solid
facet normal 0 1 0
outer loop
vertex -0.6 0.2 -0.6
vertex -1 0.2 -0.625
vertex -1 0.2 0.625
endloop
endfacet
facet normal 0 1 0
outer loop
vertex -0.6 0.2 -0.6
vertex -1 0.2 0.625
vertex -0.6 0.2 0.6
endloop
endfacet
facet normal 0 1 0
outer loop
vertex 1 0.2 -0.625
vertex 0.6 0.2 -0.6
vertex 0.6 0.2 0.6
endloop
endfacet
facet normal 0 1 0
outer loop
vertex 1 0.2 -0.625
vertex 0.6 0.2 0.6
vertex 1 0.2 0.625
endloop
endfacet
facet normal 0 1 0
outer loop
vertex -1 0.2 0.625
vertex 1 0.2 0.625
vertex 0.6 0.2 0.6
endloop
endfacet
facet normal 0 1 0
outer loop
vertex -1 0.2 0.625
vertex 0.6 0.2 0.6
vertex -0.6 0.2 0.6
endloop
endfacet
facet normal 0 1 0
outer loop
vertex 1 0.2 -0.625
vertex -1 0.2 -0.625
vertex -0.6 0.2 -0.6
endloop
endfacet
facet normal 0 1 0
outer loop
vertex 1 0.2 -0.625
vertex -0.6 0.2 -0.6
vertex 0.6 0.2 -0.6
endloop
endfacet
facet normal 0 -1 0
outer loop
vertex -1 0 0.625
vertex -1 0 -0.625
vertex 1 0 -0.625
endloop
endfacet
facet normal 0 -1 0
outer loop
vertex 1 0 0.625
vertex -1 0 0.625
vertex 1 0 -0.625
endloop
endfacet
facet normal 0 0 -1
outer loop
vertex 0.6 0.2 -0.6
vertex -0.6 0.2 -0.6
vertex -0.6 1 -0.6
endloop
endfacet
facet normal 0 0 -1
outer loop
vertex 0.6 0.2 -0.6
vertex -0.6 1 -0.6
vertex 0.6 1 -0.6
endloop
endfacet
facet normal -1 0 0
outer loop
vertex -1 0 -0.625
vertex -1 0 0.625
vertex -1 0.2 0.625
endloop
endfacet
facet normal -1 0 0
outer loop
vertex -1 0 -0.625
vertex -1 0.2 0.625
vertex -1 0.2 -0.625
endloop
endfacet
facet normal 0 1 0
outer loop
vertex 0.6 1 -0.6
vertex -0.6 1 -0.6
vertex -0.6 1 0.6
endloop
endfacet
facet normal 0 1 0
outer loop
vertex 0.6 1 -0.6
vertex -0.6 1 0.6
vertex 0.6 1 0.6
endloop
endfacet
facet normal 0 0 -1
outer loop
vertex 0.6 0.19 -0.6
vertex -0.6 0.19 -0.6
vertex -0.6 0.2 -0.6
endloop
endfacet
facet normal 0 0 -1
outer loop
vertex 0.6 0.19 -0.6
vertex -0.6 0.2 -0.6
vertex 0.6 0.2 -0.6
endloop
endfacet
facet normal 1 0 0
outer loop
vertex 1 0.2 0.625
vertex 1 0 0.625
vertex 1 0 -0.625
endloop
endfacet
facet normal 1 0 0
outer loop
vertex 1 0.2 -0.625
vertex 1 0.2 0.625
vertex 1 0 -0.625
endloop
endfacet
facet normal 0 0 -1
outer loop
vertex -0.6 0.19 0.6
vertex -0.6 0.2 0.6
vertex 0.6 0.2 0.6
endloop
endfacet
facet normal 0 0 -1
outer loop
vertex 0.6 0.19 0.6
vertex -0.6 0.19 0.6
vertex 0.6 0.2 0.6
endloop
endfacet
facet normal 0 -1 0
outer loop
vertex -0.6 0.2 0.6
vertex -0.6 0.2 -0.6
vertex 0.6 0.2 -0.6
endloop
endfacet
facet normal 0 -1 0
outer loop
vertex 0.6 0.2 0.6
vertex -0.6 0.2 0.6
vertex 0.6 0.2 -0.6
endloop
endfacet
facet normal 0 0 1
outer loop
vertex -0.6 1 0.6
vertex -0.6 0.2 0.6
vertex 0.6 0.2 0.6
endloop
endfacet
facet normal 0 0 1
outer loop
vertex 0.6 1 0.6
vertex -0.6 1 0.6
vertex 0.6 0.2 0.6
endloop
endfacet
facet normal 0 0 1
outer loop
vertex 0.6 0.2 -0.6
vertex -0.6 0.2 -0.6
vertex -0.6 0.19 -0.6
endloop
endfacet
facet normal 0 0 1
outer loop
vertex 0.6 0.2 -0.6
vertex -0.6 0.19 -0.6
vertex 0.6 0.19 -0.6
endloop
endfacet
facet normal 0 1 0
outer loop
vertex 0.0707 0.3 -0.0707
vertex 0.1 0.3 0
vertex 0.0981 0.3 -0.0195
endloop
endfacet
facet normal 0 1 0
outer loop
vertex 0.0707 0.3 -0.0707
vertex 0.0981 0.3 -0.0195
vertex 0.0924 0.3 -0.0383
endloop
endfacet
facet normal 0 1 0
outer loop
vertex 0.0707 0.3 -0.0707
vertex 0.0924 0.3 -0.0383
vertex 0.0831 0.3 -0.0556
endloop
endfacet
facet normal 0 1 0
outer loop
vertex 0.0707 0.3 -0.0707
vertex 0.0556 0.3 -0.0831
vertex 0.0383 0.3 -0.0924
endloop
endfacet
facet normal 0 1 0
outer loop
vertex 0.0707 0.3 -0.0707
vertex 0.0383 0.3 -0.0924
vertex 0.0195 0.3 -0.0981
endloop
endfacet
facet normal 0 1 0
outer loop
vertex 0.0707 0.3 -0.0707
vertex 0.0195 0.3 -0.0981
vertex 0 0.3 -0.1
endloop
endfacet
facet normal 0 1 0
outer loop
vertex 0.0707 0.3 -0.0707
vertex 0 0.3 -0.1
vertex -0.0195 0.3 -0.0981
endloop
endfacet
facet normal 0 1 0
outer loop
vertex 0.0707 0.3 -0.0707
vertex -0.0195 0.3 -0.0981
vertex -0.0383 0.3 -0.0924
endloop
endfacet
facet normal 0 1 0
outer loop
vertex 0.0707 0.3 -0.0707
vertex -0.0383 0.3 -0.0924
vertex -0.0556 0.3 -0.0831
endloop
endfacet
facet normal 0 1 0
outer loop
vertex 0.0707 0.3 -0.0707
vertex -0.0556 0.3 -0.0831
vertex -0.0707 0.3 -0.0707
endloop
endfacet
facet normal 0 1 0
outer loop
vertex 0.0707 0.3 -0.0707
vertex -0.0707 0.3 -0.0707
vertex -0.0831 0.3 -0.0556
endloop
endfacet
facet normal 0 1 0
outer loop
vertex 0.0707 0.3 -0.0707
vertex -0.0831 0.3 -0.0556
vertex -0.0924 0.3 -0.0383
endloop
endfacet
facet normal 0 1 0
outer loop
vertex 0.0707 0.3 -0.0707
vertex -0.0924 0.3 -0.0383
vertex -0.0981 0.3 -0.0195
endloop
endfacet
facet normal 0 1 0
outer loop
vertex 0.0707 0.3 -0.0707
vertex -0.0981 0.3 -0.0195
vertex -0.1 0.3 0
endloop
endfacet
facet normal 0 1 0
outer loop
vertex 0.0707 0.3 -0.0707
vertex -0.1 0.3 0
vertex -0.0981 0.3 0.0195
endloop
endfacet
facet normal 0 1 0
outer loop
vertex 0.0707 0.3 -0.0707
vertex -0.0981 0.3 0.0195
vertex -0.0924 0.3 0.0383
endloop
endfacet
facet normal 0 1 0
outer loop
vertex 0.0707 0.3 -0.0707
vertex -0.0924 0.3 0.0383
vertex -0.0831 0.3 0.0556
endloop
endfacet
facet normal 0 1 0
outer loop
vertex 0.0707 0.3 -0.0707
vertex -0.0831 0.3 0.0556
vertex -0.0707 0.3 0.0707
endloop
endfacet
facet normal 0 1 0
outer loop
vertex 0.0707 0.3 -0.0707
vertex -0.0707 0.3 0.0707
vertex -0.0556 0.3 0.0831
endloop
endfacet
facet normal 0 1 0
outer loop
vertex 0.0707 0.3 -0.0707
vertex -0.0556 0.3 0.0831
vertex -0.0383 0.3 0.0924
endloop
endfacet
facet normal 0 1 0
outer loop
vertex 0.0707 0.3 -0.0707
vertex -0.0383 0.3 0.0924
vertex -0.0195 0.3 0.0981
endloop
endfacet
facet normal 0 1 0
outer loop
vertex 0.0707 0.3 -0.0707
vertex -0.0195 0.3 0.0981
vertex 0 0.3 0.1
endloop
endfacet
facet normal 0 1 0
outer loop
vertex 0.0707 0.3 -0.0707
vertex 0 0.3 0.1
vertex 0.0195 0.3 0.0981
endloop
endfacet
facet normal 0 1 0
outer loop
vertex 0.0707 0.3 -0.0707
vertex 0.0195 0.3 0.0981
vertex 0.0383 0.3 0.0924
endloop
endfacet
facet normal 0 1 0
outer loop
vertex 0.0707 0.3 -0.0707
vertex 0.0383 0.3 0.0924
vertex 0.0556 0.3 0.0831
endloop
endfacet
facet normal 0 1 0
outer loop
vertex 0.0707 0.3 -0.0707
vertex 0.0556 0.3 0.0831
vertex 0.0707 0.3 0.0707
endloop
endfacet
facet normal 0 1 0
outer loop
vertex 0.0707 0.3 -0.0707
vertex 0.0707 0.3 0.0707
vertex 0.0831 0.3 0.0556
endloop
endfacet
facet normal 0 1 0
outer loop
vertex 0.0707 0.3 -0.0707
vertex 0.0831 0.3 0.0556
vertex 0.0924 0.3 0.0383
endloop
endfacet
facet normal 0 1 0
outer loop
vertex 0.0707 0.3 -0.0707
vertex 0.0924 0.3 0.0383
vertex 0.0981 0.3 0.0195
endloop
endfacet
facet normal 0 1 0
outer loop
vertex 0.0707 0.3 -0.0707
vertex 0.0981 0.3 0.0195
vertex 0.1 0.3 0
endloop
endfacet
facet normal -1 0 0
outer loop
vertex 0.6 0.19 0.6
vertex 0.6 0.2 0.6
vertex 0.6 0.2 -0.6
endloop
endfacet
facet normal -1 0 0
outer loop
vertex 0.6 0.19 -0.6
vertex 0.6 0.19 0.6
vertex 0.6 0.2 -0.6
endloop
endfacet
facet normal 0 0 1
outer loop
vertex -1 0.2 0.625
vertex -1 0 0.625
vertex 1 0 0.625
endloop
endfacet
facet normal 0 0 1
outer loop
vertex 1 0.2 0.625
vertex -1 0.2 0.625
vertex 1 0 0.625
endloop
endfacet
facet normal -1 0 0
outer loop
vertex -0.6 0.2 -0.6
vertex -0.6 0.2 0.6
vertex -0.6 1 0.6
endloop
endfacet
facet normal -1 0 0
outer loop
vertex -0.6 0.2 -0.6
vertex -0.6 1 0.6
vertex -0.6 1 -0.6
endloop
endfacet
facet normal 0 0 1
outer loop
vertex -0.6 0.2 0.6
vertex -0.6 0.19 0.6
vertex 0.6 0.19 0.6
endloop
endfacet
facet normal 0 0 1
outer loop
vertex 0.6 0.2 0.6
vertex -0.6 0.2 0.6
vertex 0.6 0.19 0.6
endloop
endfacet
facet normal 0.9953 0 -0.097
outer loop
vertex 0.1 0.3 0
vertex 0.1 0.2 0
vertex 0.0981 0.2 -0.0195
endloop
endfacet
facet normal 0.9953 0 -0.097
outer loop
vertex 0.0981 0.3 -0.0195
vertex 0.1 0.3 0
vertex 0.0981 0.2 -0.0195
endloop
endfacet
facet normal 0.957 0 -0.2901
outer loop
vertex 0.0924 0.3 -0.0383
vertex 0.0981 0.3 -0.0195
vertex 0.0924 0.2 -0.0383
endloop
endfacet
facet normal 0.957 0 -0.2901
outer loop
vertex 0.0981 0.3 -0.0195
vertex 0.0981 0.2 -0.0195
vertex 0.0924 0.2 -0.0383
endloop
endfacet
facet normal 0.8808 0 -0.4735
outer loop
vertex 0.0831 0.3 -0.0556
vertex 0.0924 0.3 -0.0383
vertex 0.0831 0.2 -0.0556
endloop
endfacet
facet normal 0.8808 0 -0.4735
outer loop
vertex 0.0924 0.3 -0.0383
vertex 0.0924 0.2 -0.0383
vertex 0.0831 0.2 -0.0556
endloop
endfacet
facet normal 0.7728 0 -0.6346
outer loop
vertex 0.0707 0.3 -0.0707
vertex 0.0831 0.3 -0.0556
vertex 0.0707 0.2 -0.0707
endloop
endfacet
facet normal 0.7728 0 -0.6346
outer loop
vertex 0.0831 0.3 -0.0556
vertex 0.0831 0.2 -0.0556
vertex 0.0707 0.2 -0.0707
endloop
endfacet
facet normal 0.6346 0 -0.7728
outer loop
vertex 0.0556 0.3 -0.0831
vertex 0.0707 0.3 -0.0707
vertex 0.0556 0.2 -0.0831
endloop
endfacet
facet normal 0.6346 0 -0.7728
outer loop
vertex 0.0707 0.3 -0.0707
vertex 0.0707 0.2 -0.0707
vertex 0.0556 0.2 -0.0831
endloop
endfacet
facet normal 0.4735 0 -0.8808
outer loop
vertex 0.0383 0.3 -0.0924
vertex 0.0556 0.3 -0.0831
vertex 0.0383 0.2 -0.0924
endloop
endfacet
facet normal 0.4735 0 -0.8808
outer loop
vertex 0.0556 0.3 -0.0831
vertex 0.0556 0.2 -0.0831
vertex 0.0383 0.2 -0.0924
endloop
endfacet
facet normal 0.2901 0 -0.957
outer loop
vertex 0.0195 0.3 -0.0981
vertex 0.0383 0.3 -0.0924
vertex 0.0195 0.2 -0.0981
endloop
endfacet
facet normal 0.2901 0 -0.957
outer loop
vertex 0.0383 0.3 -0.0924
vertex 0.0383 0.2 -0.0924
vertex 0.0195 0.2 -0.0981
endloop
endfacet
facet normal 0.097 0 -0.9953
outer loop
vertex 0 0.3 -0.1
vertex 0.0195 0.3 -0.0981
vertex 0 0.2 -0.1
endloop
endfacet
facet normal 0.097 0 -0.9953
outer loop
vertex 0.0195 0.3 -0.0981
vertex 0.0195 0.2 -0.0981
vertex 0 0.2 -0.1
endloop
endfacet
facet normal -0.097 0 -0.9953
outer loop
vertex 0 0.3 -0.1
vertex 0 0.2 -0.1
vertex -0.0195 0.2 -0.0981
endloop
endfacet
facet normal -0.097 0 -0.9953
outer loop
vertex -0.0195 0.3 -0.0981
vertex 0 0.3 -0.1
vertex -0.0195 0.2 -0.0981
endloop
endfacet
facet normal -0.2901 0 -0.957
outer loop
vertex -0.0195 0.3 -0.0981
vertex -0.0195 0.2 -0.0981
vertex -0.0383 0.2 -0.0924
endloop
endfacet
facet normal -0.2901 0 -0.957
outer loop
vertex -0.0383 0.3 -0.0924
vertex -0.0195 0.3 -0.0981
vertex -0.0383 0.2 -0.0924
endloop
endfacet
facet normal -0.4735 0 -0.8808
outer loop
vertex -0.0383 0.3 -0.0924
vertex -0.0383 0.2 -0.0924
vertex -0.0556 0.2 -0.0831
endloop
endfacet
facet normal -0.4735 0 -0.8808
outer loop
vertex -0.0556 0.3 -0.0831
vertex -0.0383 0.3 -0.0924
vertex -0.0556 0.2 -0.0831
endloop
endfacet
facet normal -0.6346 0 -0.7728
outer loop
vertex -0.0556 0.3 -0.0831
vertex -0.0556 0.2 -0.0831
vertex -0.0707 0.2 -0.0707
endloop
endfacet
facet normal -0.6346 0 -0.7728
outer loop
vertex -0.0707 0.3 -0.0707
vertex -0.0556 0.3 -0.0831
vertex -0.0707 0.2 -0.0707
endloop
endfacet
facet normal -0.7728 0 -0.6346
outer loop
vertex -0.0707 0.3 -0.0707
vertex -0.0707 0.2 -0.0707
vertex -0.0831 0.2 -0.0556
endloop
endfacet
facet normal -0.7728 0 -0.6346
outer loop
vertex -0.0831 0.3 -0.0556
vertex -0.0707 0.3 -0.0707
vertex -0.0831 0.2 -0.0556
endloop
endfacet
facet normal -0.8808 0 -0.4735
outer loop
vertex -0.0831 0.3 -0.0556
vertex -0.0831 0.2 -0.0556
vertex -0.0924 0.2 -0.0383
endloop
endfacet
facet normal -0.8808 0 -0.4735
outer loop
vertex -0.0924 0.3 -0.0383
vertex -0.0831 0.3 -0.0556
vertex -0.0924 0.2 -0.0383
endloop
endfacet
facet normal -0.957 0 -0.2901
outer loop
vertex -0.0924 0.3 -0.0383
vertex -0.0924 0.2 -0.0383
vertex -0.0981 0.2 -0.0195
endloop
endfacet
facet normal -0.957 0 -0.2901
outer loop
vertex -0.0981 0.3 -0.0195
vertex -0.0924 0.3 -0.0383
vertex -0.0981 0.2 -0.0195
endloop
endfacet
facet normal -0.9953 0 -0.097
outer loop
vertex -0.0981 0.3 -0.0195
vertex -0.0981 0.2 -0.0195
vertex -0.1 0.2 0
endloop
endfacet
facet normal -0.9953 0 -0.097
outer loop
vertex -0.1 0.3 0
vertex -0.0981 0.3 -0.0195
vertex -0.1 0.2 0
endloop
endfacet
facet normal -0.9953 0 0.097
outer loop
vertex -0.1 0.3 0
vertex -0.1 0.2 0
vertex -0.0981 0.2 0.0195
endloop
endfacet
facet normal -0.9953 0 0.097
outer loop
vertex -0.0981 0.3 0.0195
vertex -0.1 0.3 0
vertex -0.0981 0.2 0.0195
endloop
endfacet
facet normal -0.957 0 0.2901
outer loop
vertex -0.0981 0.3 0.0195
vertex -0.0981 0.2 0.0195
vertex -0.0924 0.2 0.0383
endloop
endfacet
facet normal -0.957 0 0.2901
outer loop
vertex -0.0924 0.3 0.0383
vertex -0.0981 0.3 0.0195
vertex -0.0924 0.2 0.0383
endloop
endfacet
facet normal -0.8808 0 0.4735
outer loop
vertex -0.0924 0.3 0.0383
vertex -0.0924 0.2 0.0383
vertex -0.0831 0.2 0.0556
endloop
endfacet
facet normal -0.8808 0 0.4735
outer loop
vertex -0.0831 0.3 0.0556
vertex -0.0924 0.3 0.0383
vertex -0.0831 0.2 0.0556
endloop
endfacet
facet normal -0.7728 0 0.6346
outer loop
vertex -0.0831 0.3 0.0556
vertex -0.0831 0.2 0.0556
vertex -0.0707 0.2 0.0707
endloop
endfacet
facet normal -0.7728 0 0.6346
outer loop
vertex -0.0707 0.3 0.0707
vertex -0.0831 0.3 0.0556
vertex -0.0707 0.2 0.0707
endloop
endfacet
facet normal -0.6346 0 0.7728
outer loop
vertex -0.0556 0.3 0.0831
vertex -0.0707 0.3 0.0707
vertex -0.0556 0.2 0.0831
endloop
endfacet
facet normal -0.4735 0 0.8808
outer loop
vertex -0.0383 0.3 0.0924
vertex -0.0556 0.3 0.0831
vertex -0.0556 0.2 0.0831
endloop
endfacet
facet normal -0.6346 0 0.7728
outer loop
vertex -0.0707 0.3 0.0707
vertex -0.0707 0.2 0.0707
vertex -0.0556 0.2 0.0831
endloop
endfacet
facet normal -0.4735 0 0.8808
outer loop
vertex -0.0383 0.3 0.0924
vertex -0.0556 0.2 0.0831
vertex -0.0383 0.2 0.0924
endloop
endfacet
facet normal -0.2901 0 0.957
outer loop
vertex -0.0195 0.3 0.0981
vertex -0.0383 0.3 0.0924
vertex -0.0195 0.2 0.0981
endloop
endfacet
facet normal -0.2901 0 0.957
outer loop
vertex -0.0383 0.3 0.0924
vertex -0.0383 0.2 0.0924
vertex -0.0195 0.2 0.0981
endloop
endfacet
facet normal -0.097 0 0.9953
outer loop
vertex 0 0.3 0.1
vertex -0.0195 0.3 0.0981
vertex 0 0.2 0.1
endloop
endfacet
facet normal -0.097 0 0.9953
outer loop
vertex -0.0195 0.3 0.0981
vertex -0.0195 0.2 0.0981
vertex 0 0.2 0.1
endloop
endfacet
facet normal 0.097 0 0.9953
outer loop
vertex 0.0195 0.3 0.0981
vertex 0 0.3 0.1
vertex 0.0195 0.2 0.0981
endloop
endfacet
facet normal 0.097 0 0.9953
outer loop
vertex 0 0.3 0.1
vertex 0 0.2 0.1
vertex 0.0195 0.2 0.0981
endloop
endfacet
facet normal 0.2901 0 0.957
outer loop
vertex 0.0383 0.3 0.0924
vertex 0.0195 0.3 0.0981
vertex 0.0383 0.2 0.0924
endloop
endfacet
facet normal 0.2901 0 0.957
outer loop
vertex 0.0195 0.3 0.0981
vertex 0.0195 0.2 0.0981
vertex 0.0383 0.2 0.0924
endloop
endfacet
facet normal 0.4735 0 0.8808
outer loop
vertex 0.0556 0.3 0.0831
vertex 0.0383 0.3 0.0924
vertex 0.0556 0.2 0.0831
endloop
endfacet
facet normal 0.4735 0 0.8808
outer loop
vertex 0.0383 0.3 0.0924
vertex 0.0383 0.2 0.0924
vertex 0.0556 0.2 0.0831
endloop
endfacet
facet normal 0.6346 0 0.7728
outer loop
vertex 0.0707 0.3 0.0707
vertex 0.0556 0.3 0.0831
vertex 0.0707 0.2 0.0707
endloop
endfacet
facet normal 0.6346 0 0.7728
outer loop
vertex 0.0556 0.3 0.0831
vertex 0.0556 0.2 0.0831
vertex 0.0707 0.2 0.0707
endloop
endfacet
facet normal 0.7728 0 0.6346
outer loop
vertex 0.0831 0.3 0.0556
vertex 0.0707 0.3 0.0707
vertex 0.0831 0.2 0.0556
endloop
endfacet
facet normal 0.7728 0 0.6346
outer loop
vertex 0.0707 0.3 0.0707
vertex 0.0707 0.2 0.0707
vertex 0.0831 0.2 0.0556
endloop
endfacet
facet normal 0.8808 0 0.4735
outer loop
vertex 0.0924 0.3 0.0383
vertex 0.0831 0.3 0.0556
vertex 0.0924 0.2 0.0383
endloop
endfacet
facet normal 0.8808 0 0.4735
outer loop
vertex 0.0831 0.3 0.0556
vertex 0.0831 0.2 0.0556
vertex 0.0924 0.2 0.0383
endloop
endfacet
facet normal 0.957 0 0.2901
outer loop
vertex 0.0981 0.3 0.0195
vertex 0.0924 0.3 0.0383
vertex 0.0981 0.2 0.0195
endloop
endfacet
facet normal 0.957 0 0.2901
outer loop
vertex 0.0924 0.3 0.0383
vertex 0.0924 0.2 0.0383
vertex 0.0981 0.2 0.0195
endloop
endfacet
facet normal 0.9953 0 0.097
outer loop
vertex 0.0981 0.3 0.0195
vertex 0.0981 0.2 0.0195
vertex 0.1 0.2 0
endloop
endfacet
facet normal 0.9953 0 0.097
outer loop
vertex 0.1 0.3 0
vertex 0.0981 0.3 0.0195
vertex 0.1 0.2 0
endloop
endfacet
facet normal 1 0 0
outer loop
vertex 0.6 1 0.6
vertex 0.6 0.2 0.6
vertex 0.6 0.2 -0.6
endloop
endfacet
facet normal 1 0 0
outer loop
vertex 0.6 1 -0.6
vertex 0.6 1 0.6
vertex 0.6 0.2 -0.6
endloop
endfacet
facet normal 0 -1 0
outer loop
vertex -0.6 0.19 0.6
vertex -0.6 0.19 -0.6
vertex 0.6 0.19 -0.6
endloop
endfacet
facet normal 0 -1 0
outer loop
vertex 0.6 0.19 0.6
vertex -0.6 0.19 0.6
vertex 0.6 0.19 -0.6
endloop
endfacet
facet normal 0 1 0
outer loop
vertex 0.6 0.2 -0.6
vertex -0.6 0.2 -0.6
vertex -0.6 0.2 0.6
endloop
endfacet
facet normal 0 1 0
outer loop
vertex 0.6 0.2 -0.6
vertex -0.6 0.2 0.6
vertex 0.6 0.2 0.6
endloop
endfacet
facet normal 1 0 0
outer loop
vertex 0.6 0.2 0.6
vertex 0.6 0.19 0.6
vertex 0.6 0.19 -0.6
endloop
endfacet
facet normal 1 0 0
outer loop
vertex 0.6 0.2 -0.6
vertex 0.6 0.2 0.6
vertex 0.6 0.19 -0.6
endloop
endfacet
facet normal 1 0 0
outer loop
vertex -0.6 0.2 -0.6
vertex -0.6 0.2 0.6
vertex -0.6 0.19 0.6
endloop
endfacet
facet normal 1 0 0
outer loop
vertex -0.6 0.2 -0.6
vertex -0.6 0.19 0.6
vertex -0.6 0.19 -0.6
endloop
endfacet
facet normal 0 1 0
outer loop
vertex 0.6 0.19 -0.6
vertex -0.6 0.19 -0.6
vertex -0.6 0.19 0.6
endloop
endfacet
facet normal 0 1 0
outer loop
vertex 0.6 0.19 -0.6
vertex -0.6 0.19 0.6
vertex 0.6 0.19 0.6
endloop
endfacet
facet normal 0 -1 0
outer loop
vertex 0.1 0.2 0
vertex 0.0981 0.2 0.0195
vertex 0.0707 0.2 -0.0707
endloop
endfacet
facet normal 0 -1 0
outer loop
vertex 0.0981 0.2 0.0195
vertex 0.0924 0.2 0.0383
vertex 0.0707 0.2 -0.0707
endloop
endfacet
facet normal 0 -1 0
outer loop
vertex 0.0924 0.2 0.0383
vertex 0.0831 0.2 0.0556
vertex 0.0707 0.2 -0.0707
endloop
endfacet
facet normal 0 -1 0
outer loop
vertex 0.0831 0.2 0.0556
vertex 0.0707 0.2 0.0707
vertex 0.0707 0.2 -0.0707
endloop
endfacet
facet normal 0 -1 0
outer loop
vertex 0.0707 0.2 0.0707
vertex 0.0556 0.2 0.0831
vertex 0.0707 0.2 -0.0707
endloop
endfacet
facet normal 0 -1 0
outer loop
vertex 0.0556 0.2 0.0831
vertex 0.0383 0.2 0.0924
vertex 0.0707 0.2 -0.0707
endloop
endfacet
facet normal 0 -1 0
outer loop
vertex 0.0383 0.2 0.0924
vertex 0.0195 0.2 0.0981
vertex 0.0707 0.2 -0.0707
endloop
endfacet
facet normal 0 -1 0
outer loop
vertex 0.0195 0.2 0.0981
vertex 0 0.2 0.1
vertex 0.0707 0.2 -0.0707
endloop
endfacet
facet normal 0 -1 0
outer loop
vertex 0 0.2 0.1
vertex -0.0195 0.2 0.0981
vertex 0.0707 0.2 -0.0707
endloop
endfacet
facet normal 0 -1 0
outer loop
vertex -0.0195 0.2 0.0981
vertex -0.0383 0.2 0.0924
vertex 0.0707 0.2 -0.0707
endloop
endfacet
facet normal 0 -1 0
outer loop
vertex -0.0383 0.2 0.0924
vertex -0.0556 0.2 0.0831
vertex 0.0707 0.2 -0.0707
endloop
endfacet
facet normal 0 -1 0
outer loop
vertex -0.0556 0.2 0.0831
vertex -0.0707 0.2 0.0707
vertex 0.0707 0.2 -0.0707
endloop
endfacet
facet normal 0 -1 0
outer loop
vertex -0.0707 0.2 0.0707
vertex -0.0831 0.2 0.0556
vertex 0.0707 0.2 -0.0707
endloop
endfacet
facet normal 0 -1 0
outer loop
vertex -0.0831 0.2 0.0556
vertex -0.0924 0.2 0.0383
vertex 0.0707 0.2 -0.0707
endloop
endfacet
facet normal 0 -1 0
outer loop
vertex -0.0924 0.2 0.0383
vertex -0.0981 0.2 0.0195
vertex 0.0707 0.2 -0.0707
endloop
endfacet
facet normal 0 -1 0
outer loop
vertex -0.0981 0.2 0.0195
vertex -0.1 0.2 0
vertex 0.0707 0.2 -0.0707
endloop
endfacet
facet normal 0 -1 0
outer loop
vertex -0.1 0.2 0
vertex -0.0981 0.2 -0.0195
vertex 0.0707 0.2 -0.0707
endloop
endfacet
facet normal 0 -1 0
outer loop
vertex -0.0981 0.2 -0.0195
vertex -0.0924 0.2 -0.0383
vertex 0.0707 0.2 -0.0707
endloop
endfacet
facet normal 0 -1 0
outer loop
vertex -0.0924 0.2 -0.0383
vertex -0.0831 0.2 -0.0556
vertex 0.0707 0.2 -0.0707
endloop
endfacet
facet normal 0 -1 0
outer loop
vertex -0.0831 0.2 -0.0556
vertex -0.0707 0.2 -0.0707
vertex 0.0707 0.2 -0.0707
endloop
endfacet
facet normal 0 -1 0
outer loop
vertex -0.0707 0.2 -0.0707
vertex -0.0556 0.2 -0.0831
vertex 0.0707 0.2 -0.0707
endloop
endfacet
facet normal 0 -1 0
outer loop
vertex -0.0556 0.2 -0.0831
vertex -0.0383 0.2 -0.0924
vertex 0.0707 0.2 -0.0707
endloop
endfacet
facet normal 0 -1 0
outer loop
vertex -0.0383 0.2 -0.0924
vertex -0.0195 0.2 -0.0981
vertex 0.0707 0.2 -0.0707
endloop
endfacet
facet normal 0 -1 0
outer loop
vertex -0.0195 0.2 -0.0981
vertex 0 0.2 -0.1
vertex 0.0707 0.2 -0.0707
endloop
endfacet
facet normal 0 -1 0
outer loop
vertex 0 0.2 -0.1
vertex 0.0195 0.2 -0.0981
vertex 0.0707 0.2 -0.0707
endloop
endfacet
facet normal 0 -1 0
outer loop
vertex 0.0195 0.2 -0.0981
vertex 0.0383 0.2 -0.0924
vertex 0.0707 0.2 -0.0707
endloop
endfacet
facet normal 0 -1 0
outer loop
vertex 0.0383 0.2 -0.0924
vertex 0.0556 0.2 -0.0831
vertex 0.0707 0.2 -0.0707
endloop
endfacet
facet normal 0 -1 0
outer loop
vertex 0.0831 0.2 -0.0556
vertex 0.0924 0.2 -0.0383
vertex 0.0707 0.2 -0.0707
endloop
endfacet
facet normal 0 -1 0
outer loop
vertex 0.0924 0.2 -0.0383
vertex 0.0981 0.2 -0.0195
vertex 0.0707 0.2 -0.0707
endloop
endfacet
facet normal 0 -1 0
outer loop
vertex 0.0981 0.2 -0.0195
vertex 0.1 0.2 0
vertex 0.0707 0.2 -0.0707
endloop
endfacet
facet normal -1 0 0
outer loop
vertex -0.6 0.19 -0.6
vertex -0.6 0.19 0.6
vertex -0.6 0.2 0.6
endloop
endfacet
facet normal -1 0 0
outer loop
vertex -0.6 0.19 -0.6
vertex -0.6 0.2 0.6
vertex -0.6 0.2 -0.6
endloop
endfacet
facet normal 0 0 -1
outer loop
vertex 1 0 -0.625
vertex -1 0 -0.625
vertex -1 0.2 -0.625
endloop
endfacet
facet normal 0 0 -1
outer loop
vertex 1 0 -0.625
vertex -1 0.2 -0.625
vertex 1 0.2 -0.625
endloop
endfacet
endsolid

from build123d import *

# Parameters (mm, degrees)
SKETCH1_R           = 0.1
BOSS_EXTRUDE1_DEPTH = 0.3
SKETCH2_W           = 2
SKETCH2_H           = 1.25
BOSS_EXTRUDE2_DEPTH = 0.2
SKETCH3_W           = 1.2
SKETCH3_H           = 1.2
CUT_EXTRUDE1_DEPTH  = 0.01
SKETCH4_W           = 1.2
SKETCH4_H           = 1.2
BOSS_EXTRUDE4_DEPTH = 0.01
SKETCH5_W           = 1.2
SKETCH5_H           = 1.2
BOSS_EXTRUDE5_DEPTH = 0.8


with BuildPart() as part:
    # Sketch1 → Boss-Extrude1 (new body)
    with BuildSketch(Plane(origin=(0, 0, 0), x_dir=(1, 0, 0), z_dir=(0, 1, 0))):
        Circle(SKETCH1_R)
    extrude(amount=BOSS_EXTRUDE1_DEPTH)

    # Sketch2 → Boss-Extrude2 (add)
    with BuildSketch(Plane(origin=(0, 0, 0), x_dir=(1, 0, 0), z_dir=(0, 1, 0))):
        Rectangle(SKETCH2_W, SKETCH2_H)
    extrude(amount=BOSS_EXTRUDE2_DEPTH)

    # Sketch3 → Cut-Extrude1 (cut)
    with BuildSketch(Plane(origin=(0, 0.2, 0), x_dir=(1, 0, 0), z_dir=(0, 1, 0))):
        Rectangle(SKETCH3_W, SKETCH3_H)
    extrude(amount=-CUT_EXTRUDE1_DEPTH, mode=Mode.SUBTRACT)


with BuildPart() as body_2:
    # Sketch4 → Boss-Extrude4 (new body)
    with BuildSketch(Plane(origin=(0, 0.19, 0), x_dir=(1, 0, 0), z_dir=(0, 1, 0))):
        Rectangle(SKETCH4_W, SKETCH4_H)
    extrude(amount=BOSS_EXTRUDE4_DEPTH)


with BuildPart() as body_3:
    # Sketch5 → Boss-Extrude5 (new body)
    with BuildSketch(Plane(origin=(0, 0.2, 0), x_dir=(1, 0, 0), z_dir=(0, 1, 0))):
        Rectangle(SKETCH5_W, SKETCH5_H)
    extrude(amount=BOSS_EXTRUDE5_DEPTH)


solid = Compound([part.part, body_2.part, body_3.part])
